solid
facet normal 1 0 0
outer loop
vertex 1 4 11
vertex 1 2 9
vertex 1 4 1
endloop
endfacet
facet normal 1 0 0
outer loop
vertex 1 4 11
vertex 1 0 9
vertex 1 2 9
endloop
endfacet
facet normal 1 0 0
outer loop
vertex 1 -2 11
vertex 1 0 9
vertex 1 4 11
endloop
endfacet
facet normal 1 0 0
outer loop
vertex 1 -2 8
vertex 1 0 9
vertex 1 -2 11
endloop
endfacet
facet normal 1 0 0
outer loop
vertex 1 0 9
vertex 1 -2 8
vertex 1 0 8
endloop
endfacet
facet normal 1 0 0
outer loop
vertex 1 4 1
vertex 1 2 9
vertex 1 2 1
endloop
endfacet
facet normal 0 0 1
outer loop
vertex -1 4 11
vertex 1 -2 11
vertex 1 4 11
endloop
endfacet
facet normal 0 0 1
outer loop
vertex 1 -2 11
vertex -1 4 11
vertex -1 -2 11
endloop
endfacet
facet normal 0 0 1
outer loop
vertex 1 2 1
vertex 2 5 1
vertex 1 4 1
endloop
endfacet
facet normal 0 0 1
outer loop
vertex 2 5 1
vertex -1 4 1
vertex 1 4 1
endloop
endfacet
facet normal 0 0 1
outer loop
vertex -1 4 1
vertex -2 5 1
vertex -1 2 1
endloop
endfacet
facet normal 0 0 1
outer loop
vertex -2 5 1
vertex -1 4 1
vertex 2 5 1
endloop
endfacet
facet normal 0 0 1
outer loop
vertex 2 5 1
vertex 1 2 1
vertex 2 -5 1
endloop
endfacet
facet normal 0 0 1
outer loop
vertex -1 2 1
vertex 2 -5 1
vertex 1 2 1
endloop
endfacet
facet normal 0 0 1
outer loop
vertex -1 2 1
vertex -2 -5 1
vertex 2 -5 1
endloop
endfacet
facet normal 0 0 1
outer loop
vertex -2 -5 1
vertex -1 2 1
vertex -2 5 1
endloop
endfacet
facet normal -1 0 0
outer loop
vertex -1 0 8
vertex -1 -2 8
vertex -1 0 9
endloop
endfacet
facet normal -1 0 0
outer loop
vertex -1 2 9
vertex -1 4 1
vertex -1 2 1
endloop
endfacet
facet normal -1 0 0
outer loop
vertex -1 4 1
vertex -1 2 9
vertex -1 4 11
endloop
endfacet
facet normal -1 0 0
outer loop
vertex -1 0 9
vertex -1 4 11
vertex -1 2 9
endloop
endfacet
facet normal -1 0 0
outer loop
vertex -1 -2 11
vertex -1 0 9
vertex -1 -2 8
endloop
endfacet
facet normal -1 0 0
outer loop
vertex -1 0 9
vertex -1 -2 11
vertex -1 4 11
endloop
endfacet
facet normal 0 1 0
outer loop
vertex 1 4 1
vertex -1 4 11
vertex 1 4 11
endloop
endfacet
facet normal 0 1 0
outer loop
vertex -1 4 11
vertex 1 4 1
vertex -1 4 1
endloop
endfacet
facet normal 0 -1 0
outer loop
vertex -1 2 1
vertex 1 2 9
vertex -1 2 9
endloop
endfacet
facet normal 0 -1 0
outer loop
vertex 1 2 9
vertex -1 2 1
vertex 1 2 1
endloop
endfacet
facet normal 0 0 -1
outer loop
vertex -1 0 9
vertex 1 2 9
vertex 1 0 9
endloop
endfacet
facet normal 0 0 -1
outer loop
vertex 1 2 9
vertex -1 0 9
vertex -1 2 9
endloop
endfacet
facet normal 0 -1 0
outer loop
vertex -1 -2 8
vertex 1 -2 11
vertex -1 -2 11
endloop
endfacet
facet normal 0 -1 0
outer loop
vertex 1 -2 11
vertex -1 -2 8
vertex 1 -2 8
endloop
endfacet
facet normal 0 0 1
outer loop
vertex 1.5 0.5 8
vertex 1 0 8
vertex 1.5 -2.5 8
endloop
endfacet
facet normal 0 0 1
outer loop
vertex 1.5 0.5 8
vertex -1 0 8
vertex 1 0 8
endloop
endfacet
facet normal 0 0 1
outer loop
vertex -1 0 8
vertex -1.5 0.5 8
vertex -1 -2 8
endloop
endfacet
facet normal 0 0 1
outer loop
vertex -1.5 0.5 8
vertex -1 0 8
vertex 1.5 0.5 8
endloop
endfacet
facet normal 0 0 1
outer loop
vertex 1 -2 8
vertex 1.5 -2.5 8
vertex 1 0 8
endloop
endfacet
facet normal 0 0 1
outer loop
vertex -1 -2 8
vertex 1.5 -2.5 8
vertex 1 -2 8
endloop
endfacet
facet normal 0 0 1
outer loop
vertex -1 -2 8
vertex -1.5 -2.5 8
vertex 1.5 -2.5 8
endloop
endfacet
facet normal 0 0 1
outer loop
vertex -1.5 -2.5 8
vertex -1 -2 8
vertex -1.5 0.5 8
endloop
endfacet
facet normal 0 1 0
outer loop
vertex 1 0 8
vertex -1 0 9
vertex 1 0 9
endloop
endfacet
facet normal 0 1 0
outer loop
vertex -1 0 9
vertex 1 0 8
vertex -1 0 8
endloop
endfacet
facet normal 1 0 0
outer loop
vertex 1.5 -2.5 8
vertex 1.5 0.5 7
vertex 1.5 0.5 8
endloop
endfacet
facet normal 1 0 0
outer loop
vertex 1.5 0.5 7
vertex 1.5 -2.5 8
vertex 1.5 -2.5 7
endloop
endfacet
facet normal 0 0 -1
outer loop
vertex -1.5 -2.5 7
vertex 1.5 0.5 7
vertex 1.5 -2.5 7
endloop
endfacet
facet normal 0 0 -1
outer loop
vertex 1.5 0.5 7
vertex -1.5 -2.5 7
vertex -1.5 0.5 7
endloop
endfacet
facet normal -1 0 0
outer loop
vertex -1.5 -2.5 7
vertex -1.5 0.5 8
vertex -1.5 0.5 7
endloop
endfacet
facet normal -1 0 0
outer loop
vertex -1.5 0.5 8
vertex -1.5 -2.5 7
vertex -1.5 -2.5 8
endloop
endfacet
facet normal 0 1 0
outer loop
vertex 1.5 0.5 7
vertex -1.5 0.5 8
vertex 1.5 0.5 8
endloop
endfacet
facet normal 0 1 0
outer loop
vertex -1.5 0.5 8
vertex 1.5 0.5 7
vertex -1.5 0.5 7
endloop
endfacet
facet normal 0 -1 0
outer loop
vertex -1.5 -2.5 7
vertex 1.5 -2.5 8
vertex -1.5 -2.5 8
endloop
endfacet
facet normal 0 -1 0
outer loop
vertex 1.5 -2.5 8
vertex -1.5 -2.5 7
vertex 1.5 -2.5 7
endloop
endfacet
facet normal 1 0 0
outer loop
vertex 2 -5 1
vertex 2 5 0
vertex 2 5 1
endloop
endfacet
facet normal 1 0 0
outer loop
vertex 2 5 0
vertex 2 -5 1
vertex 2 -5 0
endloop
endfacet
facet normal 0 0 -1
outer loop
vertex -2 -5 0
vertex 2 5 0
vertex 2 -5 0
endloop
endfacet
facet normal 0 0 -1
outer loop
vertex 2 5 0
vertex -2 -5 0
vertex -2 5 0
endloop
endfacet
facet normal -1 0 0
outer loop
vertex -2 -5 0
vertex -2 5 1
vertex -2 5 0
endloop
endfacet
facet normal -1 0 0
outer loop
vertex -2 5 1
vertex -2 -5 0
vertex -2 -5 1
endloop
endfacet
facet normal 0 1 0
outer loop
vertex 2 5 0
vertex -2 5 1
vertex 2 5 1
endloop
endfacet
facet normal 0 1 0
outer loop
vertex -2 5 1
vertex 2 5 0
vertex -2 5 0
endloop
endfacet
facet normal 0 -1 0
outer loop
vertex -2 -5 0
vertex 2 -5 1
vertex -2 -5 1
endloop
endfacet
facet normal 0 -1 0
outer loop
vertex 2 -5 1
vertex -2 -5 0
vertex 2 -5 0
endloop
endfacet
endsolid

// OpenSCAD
color([255/255, 0/255, 0/255]) {
  translate([0, 0, .5]) cube(size=[4, 10, 1], center=true);
}

color([0/255, 255/255, 0/255]) {
  translate([0, 3, 6]) cube(size=[2, 2, 10], center=true);
  translate([0, 0, 10]) cube(size=[2, 4, 2], center=true);
  translate([0, -1, 8.5]) cube(size=[2, 2, 1], center=true);
  translate([0, -1, 7.5]) cube(size=[3, 3, 1], center=true);
}
